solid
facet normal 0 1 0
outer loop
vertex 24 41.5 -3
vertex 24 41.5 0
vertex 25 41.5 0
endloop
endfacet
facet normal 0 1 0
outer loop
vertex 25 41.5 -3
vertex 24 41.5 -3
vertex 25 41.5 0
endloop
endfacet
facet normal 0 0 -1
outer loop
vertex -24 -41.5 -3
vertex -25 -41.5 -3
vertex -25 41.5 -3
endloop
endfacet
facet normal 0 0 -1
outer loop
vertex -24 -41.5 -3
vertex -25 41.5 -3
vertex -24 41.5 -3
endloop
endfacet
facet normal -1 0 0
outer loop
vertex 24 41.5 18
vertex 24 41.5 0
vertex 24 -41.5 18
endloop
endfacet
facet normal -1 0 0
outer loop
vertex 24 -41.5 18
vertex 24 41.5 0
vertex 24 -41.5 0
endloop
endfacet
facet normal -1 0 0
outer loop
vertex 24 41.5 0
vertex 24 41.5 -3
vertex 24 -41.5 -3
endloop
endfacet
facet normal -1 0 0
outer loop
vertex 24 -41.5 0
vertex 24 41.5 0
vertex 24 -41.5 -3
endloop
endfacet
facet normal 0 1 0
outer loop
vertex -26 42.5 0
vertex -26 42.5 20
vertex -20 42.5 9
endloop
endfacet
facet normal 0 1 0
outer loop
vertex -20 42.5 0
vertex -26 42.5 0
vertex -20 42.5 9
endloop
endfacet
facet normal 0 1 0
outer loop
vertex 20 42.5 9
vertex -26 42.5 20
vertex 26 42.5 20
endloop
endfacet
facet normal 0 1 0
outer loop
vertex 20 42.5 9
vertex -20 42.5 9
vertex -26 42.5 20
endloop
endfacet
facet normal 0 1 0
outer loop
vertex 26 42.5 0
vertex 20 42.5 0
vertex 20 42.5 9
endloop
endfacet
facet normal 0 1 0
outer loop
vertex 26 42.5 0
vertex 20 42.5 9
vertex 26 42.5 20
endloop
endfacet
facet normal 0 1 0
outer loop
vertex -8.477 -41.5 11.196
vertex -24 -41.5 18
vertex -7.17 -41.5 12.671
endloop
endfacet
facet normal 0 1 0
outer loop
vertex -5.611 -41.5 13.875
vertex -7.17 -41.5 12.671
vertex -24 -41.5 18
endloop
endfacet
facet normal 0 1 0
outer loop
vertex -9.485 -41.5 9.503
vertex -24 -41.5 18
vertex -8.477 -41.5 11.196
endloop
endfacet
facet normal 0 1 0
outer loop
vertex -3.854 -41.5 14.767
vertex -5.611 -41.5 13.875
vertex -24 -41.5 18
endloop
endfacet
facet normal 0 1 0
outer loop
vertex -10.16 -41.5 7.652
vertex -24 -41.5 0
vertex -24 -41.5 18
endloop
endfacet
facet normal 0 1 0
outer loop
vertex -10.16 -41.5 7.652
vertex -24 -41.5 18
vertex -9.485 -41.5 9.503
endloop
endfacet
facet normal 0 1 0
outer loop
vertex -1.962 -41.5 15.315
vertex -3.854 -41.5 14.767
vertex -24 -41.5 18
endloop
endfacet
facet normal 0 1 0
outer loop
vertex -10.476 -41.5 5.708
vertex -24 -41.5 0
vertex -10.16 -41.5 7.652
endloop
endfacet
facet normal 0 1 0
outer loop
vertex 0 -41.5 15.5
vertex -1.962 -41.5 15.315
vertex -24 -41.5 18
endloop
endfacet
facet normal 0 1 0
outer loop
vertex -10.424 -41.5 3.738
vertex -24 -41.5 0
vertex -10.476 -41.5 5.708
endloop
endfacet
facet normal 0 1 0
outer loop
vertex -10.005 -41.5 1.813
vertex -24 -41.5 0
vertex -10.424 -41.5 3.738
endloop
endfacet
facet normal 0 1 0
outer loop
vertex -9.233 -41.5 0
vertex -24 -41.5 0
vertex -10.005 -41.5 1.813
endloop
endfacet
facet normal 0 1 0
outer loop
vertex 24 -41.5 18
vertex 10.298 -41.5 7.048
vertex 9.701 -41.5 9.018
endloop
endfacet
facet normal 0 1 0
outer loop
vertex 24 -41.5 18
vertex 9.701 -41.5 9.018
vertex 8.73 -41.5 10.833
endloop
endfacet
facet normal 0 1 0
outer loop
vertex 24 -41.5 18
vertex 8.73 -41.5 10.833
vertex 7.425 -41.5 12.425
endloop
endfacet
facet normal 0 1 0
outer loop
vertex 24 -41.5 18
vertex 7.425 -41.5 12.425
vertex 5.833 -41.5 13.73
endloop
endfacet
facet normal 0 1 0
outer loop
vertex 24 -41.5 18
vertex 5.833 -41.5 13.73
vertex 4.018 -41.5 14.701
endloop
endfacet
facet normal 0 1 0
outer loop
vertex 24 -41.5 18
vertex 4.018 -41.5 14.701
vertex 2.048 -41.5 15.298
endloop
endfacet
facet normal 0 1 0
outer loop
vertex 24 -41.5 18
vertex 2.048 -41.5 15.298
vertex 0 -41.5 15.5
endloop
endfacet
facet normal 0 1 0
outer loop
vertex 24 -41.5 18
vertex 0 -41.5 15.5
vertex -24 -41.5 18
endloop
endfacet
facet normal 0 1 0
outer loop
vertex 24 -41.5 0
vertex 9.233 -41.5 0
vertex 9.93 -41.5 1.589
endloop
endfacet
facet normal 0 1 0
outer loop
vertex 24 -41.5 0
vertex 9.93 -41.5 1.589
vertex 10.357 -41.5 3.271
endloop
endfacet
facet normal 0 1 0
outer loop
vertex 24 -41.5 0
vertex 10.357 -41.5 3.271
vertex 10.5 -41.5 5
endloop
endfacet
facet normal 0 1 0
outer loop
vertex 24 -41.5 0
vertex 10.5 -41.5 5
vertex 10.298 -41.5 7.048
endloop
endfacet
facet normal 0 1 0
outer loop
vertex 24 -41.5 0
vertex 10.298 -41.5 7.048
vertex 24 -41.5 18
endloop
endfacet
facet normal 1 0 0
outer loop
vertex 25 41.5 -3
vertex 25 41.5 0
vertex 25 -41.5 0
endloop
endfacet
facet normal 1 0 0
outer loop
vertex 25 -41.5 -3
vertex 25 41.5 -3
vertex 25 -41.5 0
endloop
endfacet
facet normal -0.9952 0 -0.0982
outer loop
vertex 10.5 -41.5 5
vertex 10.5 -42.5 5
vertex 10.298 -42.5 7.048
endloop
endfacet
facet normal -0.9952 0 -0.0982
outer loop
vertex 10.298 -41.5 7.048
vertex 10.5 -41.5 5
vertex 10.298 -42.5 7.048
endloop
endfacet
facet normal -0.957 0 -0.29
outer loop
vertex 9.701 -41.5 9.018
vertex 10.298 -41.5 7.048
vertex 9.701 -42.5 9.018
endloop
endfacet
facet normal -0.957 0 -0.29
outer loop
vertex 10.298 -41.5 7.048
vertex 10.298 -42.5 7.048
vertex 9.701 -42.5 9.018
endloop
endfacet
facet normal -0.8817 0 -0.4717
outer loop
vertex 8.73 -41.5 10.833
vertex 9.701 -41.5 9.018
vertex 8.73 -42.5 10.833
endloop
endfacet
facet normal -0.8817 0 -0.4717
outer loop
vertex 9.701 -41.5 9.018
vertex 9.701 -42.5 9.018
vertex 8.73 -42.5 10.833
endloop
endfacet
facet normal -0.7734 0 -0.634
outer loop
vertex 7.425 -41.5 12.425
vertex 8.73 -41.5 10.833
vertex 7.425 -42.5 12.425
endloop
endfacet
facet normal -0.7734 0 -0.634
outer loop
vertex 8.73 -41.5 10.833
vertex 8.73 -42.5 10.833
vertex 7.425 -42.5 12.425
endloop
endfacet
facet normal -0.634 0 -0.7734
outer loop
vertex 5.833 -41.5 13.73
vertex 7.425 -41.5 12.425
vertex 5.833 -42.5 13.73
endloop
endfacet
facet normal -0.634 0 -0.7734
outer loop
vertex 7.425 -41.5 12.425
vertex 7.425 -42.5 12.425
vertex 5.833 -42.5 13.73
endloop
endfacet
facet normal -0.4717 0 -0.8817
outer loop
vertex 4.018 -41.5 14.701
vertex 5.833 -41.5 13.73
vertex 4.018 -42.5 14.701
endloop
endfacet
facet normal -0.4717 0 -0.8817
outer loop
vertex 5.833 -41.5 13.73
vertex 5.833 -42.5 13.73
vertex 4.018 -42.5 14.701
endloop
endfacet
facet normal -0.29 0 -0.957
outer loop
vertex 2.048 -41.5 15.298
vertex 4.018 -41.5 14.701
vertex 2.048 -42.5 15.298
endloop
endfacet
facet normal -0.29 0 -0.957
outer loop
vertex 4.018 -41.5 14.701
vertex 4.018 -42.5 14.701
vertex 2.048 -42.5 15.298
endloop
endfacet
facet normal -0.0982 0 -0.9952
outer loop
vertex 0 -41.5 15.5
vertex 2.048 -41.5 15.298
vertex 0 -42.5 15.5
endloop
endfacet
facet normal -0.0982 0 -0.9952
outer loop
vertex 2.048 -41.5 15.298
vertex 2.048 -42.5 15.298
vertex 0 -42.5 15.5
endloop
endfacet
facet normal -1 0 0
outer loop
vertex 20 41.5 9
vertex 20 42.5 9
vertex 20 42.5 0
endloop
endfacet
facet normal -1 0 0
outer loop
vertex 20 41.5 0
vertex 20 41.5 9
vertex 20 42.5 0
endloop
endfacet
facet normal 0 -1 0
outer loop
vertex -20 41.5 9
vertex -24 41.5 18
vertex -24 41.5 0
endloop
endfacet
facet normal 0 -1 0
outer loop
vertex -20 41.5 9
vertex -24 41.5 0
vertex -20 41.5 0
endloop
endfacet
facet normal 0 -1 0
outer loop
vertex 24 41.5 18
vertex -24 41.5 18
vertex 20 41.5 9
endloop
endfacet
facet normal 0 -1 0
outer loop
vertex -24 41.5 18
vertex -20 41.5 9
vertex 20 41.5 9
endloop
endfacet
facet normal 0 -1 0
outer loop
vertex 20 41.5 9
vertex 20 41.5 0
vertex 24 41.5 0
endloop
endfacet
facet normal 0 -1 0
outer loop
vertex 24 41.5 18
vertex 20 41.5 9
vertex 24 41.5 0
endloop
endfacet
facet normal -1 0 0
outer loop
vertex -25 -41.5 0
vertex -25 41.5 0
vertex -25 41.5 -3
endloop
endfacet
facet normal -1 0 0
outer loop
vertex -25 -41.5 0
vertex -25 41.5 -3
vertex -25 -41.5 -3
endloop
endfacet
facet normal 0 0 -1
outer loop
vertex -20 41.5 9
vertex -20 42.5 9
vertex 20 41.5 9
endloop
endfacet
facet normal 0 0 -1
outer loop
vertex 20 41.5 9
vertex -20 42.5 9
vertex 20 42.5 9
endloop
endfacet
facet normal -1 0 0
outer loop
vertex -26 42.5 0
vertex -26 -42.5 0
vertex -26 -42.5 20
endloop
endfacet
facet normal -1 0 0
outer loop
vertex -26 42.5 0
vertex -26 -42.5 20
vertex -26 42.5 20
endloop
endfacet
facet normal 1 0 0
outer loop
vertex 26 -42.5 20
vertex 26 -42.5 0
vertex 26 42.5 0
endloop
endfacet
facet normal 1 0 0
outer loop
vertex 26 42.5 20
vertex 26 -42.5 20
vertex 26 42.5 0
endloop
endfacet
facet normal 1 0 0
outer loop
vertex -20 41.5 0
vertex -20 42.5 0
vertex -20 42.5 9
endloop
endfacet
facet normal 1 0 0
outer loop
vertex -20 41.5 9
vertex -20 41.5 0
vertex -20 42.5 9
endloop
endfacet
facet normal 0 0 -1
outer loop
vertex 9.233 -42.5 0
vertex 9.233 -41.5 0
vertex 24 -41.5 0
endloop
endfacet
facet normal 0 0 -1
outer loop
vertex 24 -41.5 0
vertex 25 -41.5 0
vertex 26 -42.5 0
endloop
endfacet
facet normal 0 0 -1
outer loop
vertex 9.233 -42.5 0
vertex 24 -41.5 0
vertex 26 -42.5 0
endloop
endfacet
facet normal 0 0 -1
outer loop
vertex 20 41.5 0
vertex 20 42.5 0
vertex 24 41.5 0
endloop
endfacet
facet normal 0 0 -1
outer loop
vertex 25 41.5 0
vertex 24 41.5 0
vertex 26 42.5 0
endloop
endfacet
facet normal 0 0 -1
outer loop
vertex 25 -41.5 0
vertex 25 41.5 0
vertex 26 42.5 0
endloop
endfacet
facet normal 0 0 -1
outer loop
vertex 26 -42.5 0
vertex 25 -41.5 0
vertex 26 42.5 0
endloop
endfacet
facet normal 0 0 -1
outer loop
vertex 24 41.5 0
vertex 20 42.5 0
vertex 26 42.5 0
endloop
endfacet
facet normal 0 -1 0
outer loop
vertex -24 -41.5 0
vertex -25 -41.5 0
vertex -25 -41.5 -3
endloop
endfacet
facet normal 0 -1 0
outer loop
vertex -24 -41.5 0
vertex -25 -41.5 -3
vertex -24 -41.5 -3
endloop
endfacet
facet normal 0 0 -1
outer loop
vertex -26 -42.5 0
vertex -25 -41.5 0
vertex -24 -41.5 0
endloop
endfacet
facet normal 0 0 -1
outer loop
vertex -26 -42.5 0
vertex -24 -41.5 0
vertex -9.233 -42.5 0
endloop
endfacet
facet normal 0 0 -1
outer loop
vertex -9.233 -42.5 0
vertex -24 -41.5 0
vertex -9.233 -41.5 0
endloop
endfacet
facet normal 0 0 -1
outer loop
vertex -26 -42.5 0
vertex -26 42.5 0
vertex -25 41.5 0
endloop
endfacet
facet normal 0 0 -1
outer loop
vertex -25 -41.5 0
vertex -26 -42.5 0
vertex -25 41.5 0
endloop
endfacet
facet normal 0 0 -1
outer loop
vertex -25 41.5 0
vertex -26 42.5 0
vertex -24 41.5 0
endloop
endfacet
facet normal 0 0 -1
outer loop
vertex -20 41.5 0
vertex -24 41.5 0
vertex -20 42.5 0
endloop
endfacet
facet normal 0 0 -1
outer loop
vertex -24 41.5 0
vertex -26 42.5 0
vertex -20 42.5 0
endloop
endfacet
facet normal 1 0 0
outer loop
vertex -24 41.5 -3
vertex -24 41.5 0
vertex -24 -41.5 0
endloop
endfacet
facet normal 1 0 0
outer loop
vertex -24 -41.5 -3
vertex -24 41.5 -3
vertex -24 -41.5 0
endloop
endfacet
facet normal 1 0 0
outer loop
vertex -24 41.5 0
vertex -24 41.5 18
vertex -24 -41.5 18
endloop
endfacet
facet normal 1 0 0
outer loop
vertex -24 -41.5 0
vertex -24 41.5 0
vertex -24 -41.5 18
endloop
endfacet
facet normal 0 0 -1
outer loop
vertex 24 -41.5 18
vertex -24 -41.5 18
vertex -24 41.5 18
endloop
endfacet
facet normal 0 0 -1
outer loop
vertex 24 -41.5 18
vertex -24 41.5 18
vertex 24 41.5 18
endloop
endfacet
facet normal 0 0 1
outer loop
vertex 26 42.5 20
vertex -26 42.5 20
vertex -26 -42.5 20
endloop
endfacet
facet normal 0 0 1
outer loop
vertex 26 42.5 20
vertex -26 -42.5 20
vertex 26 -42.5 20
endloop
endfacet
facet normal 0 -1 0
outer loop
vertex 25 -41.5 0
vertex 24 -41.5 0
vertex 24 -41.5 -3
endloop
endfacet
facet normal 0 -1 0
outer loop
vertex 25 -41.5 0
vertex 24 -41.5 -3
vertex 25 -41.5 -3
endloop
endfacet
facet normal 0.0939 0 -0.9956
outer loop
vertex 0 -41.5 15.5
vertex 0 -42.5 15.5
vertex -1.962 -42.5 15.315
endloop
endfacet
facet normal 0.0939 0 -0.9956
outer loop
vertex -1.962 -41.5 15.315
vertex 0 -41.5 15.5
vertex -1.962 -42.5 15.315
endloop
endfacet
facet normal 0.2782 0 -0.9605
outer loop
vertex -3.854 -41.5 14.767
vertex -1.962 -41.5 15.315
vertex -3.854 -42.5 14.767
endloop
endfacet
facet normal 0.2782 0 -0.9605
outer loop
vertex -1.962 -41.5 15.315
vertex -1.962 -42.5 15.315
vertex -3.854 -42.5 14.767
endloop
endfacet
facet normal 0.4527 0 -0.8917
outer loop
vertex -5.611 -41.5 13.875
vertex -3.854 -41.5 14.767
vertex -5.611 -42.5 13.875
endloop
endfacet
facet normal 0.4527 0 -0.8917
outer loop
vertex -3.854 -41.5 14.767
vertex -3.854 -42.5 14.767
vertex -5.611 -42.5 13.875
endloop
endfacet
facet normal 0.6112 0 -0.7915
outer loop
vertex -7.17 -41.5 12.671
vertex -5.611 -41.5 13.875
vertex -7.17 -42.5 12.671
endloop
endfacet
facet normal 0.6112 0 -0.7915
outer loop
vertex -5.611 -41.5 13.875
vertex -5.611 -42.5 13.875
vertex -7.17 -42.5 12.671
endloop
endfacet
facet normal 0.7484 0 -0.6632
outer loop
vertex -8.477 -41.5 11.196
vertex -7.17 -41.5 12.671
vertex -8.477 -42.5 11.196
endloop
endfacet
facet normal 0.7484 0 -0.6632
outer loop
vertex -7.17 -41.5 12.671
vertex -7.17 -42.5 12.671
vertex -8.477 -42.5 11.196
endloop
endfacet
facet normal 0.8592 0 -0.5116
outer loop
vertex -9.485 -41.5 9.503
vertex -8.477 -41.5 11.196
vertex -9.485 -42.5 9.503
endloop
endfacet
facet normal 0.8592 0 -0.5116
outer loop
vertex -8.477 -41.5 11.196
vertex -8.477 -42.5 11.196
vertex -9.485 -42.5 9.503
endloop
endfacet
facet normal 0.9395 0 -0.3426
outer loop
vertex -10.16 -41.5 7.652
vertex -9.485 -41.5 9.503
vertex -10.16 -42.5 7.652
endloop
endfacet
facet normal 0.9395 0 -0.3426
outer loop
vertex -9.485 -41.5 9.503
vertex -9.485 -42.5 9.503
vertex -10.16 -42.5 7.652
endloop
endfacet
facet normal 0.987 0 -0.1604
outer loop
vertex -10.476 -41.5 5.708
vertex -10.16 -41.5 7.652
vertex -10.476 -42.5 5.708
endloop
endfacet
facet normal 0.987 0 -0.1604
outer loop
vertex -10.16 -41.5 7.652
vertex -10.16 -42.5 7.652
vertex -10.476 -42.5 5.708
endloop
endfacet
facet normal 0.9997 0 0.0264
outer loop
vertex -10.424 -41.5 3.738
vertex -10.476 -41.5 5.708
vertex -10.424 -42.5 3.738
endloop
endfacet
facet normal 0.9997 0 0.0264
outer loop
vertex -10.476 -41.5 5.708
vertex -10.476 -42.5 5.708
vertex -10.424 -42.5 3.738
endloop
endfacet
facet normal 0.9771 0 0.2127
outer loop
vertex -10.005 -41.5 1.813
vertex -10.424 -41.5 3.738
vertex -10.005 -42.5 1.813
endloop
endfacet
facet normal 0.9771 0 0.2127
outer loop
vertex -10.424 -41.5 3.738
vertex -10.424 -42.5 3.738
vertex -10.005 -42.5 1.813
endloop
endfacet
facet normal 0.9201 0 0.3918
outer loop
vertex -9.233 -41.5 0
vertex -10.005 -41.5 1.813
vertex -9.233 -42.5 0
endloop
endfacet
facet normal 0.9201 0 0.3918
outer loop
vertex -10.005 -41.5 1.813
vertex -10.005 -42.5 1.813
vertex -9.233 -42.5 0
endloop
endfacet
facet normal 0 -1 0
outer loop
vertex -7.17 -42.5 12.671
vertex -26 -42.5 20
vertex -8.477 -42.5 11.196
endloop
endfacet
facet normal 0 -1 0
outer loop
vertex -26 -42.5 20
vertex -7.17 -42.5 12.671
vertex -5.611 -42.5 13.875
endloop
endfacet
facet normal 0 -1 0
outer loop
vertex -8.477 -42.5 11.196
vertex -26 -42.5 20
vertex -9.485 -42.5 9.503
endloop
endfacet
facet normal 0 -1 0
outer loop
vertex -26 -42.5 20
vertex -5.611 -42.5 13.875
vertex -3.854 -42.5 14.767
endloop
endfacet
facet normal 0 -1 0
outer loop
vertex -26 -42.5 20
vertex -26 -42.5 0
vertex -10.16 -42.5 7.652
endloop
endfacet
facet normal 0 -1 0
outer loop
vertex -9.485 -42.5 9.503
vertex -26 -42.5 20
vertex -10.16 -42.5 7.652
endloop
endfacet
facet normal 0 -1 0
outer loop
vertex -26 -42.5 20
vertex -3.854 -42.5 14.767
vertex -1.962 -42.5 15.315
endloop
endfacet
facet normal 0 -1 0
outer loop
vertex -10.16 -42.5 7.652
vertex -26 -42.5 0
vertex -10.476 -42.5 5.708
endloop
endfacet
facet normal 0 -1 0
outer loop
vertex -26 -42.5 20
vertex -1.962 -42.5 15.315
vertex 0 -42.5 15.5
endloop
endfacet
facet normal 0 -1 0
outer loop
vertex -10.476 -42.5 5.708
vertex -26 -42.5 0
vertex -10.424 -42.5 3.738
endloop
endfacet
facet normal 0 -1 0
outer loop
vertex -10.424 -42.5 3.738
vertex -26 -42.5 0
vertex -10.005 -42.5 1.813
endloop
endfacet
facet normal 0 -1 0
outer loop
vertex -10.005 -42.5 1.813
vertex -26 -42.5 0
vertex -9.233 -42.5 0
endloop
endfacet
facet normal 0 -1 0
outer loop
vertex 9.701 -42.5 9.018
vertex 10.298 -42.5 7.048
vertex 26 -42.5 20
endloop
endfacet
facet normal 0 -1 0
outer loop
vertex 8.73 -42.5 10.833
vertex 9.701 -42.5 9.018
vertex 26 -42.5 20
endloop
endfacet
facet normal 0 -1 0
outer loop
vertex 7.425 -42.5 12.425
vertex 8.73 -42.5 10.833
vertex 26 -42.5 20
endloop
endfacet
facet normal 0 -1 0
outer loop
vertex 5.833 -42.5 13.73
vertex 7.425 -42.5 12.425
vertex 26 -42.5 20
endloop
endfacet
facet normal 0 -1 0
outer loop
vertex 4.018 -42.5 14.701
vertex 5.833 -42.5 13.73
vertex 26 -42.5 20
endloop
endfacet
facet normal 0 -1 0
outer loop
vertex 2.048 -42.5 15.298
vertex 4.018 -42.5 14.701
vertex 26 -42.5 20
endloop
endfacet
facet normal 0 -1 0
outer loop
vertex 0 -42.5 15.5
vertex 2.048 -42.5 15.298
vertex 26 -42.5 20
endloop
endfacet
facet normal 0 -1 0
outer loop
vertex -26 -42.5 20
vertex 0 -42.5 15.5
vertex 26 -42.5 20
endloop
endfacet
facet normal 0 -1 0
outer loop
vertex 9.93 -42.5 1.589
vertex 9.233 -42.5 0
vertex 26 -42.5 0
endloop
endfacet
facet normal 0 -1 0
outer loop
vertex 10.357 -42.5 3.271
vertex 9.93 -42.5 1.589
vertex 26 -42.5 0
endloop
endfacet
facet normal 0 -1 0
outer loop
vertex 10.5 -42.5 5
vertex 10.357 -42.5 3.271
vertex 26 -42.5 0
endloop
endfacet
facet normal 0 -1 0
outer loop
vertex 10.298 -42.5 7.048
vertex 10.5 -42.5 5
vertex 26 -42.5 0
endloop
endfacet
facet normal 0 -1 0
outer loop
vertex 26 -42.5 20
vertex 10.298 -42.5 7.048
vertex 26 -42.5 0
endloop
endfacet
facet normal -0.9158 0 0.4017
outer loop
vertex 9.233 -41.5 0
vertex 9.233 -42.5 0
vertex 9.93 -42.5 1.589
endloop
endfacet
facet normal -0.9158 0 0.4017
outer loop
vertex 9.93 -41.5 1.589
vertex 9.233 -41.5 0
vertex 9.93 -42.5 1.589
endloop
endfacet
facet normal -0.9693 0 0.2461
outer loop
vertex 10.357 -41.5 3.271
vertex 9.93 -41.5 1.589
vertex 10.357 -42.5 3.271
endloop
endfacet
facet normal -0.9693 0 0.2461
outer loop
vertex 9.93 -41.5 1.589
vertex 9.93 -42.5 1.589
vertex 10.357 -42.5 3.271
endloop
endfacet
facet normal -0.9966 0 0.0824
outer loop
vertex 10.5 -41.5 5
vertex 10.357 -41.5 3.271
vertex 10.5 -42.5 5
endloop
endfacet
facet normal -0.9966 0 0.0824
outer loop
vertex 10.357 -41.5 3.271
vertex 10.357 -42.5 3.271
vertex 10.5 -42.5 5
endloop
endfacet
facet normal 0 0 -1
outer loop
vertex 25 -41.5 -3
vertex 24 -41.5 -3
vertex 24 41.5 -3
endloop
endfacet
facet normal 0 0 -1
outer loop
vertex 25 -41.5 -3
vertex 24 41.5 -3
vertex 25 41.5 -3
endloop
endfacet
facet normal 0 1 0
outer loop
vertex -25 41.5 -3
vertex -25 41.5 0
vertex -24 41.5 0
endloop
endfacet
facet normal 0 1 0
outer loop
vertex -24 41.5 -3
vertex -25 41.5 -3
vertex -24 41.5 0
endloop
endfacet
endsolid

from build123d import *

# Parameters (mm, degrees)
F0_W     = 52
F0_H     = 85
F1_DEPTH = 20
F2_W     = 48
F2_H     = 83
F3_DEPTH = 18
F4_W     = 1
F4_H     = 83
F5_DEPTH = 3
F7_DEPTH = 25
F9_DEPTH = 25


with BuildPart() as f1:
    # F0 (on Top) → F1 (new body)
    with BuildSketch(Plane.XY):
        Rectangle(F0_W, F0_H)
    extrude(amount=F1_DEPTH)

    # F2 (on face) → F3 (cut)
    with BuildSketch(Plane(origin=(0, 0, 0), x_dir=(1, 0, 0), z_dir=(0, 0, -1))):
        Rectangle(F2_W, F2_H)
    extrude(amount=-F3_DEPTH, mode=Mode.SUBTRACT)

    # F4 (on face) → F5 (join)
    with BuildSketch(Plane(origin=(0, 0, 0), x_dir=(1, 0, 0), z_dir=(0, 0, -1))):
        with Locations((-24.5, 0)):
            Rectangle(F4_W, F4_H)
        with Locations((24.5, 0)):
            Rectangle(F4_W, F4_H)
    extrude(amount=F5_DEPTH)

    # F6 (on face) → F7 (cut)
    with BuildSketch(Plane(origin=(0, 42.5, 0), x_dir=(-1, 0, 0), z_dir=(0, 1, 0))):
        Polygon((-20, 0), (0, 0), (20, 0), (20, 9), (-20, 9), align=None)
    extrude(amount=-F7_DEPTH, mode=Mode.SUBTRACT)

    # F8 (on face) → F9 (cut)
    with BuildSketch(Plane.XZ.offset(42.5)):
        with BuildLine():
            ThreePointArc((10.5, 5), (7.424621, 12.424621), (0, 15.5))
            ThreePointArc((0, 15.5), (-9.020809, 10.373546), (-9.233093, 0))
            Line((-9.233093, 0), (9.233093, 0))
            ThreePointArc((9.233093, 0), (10.178346, 2.420996), (10.5, 5))
        make_face()
    extrude(amount=-F9_DEPTH, mode=Mode.SUBTRACT)


solid = f1.part
